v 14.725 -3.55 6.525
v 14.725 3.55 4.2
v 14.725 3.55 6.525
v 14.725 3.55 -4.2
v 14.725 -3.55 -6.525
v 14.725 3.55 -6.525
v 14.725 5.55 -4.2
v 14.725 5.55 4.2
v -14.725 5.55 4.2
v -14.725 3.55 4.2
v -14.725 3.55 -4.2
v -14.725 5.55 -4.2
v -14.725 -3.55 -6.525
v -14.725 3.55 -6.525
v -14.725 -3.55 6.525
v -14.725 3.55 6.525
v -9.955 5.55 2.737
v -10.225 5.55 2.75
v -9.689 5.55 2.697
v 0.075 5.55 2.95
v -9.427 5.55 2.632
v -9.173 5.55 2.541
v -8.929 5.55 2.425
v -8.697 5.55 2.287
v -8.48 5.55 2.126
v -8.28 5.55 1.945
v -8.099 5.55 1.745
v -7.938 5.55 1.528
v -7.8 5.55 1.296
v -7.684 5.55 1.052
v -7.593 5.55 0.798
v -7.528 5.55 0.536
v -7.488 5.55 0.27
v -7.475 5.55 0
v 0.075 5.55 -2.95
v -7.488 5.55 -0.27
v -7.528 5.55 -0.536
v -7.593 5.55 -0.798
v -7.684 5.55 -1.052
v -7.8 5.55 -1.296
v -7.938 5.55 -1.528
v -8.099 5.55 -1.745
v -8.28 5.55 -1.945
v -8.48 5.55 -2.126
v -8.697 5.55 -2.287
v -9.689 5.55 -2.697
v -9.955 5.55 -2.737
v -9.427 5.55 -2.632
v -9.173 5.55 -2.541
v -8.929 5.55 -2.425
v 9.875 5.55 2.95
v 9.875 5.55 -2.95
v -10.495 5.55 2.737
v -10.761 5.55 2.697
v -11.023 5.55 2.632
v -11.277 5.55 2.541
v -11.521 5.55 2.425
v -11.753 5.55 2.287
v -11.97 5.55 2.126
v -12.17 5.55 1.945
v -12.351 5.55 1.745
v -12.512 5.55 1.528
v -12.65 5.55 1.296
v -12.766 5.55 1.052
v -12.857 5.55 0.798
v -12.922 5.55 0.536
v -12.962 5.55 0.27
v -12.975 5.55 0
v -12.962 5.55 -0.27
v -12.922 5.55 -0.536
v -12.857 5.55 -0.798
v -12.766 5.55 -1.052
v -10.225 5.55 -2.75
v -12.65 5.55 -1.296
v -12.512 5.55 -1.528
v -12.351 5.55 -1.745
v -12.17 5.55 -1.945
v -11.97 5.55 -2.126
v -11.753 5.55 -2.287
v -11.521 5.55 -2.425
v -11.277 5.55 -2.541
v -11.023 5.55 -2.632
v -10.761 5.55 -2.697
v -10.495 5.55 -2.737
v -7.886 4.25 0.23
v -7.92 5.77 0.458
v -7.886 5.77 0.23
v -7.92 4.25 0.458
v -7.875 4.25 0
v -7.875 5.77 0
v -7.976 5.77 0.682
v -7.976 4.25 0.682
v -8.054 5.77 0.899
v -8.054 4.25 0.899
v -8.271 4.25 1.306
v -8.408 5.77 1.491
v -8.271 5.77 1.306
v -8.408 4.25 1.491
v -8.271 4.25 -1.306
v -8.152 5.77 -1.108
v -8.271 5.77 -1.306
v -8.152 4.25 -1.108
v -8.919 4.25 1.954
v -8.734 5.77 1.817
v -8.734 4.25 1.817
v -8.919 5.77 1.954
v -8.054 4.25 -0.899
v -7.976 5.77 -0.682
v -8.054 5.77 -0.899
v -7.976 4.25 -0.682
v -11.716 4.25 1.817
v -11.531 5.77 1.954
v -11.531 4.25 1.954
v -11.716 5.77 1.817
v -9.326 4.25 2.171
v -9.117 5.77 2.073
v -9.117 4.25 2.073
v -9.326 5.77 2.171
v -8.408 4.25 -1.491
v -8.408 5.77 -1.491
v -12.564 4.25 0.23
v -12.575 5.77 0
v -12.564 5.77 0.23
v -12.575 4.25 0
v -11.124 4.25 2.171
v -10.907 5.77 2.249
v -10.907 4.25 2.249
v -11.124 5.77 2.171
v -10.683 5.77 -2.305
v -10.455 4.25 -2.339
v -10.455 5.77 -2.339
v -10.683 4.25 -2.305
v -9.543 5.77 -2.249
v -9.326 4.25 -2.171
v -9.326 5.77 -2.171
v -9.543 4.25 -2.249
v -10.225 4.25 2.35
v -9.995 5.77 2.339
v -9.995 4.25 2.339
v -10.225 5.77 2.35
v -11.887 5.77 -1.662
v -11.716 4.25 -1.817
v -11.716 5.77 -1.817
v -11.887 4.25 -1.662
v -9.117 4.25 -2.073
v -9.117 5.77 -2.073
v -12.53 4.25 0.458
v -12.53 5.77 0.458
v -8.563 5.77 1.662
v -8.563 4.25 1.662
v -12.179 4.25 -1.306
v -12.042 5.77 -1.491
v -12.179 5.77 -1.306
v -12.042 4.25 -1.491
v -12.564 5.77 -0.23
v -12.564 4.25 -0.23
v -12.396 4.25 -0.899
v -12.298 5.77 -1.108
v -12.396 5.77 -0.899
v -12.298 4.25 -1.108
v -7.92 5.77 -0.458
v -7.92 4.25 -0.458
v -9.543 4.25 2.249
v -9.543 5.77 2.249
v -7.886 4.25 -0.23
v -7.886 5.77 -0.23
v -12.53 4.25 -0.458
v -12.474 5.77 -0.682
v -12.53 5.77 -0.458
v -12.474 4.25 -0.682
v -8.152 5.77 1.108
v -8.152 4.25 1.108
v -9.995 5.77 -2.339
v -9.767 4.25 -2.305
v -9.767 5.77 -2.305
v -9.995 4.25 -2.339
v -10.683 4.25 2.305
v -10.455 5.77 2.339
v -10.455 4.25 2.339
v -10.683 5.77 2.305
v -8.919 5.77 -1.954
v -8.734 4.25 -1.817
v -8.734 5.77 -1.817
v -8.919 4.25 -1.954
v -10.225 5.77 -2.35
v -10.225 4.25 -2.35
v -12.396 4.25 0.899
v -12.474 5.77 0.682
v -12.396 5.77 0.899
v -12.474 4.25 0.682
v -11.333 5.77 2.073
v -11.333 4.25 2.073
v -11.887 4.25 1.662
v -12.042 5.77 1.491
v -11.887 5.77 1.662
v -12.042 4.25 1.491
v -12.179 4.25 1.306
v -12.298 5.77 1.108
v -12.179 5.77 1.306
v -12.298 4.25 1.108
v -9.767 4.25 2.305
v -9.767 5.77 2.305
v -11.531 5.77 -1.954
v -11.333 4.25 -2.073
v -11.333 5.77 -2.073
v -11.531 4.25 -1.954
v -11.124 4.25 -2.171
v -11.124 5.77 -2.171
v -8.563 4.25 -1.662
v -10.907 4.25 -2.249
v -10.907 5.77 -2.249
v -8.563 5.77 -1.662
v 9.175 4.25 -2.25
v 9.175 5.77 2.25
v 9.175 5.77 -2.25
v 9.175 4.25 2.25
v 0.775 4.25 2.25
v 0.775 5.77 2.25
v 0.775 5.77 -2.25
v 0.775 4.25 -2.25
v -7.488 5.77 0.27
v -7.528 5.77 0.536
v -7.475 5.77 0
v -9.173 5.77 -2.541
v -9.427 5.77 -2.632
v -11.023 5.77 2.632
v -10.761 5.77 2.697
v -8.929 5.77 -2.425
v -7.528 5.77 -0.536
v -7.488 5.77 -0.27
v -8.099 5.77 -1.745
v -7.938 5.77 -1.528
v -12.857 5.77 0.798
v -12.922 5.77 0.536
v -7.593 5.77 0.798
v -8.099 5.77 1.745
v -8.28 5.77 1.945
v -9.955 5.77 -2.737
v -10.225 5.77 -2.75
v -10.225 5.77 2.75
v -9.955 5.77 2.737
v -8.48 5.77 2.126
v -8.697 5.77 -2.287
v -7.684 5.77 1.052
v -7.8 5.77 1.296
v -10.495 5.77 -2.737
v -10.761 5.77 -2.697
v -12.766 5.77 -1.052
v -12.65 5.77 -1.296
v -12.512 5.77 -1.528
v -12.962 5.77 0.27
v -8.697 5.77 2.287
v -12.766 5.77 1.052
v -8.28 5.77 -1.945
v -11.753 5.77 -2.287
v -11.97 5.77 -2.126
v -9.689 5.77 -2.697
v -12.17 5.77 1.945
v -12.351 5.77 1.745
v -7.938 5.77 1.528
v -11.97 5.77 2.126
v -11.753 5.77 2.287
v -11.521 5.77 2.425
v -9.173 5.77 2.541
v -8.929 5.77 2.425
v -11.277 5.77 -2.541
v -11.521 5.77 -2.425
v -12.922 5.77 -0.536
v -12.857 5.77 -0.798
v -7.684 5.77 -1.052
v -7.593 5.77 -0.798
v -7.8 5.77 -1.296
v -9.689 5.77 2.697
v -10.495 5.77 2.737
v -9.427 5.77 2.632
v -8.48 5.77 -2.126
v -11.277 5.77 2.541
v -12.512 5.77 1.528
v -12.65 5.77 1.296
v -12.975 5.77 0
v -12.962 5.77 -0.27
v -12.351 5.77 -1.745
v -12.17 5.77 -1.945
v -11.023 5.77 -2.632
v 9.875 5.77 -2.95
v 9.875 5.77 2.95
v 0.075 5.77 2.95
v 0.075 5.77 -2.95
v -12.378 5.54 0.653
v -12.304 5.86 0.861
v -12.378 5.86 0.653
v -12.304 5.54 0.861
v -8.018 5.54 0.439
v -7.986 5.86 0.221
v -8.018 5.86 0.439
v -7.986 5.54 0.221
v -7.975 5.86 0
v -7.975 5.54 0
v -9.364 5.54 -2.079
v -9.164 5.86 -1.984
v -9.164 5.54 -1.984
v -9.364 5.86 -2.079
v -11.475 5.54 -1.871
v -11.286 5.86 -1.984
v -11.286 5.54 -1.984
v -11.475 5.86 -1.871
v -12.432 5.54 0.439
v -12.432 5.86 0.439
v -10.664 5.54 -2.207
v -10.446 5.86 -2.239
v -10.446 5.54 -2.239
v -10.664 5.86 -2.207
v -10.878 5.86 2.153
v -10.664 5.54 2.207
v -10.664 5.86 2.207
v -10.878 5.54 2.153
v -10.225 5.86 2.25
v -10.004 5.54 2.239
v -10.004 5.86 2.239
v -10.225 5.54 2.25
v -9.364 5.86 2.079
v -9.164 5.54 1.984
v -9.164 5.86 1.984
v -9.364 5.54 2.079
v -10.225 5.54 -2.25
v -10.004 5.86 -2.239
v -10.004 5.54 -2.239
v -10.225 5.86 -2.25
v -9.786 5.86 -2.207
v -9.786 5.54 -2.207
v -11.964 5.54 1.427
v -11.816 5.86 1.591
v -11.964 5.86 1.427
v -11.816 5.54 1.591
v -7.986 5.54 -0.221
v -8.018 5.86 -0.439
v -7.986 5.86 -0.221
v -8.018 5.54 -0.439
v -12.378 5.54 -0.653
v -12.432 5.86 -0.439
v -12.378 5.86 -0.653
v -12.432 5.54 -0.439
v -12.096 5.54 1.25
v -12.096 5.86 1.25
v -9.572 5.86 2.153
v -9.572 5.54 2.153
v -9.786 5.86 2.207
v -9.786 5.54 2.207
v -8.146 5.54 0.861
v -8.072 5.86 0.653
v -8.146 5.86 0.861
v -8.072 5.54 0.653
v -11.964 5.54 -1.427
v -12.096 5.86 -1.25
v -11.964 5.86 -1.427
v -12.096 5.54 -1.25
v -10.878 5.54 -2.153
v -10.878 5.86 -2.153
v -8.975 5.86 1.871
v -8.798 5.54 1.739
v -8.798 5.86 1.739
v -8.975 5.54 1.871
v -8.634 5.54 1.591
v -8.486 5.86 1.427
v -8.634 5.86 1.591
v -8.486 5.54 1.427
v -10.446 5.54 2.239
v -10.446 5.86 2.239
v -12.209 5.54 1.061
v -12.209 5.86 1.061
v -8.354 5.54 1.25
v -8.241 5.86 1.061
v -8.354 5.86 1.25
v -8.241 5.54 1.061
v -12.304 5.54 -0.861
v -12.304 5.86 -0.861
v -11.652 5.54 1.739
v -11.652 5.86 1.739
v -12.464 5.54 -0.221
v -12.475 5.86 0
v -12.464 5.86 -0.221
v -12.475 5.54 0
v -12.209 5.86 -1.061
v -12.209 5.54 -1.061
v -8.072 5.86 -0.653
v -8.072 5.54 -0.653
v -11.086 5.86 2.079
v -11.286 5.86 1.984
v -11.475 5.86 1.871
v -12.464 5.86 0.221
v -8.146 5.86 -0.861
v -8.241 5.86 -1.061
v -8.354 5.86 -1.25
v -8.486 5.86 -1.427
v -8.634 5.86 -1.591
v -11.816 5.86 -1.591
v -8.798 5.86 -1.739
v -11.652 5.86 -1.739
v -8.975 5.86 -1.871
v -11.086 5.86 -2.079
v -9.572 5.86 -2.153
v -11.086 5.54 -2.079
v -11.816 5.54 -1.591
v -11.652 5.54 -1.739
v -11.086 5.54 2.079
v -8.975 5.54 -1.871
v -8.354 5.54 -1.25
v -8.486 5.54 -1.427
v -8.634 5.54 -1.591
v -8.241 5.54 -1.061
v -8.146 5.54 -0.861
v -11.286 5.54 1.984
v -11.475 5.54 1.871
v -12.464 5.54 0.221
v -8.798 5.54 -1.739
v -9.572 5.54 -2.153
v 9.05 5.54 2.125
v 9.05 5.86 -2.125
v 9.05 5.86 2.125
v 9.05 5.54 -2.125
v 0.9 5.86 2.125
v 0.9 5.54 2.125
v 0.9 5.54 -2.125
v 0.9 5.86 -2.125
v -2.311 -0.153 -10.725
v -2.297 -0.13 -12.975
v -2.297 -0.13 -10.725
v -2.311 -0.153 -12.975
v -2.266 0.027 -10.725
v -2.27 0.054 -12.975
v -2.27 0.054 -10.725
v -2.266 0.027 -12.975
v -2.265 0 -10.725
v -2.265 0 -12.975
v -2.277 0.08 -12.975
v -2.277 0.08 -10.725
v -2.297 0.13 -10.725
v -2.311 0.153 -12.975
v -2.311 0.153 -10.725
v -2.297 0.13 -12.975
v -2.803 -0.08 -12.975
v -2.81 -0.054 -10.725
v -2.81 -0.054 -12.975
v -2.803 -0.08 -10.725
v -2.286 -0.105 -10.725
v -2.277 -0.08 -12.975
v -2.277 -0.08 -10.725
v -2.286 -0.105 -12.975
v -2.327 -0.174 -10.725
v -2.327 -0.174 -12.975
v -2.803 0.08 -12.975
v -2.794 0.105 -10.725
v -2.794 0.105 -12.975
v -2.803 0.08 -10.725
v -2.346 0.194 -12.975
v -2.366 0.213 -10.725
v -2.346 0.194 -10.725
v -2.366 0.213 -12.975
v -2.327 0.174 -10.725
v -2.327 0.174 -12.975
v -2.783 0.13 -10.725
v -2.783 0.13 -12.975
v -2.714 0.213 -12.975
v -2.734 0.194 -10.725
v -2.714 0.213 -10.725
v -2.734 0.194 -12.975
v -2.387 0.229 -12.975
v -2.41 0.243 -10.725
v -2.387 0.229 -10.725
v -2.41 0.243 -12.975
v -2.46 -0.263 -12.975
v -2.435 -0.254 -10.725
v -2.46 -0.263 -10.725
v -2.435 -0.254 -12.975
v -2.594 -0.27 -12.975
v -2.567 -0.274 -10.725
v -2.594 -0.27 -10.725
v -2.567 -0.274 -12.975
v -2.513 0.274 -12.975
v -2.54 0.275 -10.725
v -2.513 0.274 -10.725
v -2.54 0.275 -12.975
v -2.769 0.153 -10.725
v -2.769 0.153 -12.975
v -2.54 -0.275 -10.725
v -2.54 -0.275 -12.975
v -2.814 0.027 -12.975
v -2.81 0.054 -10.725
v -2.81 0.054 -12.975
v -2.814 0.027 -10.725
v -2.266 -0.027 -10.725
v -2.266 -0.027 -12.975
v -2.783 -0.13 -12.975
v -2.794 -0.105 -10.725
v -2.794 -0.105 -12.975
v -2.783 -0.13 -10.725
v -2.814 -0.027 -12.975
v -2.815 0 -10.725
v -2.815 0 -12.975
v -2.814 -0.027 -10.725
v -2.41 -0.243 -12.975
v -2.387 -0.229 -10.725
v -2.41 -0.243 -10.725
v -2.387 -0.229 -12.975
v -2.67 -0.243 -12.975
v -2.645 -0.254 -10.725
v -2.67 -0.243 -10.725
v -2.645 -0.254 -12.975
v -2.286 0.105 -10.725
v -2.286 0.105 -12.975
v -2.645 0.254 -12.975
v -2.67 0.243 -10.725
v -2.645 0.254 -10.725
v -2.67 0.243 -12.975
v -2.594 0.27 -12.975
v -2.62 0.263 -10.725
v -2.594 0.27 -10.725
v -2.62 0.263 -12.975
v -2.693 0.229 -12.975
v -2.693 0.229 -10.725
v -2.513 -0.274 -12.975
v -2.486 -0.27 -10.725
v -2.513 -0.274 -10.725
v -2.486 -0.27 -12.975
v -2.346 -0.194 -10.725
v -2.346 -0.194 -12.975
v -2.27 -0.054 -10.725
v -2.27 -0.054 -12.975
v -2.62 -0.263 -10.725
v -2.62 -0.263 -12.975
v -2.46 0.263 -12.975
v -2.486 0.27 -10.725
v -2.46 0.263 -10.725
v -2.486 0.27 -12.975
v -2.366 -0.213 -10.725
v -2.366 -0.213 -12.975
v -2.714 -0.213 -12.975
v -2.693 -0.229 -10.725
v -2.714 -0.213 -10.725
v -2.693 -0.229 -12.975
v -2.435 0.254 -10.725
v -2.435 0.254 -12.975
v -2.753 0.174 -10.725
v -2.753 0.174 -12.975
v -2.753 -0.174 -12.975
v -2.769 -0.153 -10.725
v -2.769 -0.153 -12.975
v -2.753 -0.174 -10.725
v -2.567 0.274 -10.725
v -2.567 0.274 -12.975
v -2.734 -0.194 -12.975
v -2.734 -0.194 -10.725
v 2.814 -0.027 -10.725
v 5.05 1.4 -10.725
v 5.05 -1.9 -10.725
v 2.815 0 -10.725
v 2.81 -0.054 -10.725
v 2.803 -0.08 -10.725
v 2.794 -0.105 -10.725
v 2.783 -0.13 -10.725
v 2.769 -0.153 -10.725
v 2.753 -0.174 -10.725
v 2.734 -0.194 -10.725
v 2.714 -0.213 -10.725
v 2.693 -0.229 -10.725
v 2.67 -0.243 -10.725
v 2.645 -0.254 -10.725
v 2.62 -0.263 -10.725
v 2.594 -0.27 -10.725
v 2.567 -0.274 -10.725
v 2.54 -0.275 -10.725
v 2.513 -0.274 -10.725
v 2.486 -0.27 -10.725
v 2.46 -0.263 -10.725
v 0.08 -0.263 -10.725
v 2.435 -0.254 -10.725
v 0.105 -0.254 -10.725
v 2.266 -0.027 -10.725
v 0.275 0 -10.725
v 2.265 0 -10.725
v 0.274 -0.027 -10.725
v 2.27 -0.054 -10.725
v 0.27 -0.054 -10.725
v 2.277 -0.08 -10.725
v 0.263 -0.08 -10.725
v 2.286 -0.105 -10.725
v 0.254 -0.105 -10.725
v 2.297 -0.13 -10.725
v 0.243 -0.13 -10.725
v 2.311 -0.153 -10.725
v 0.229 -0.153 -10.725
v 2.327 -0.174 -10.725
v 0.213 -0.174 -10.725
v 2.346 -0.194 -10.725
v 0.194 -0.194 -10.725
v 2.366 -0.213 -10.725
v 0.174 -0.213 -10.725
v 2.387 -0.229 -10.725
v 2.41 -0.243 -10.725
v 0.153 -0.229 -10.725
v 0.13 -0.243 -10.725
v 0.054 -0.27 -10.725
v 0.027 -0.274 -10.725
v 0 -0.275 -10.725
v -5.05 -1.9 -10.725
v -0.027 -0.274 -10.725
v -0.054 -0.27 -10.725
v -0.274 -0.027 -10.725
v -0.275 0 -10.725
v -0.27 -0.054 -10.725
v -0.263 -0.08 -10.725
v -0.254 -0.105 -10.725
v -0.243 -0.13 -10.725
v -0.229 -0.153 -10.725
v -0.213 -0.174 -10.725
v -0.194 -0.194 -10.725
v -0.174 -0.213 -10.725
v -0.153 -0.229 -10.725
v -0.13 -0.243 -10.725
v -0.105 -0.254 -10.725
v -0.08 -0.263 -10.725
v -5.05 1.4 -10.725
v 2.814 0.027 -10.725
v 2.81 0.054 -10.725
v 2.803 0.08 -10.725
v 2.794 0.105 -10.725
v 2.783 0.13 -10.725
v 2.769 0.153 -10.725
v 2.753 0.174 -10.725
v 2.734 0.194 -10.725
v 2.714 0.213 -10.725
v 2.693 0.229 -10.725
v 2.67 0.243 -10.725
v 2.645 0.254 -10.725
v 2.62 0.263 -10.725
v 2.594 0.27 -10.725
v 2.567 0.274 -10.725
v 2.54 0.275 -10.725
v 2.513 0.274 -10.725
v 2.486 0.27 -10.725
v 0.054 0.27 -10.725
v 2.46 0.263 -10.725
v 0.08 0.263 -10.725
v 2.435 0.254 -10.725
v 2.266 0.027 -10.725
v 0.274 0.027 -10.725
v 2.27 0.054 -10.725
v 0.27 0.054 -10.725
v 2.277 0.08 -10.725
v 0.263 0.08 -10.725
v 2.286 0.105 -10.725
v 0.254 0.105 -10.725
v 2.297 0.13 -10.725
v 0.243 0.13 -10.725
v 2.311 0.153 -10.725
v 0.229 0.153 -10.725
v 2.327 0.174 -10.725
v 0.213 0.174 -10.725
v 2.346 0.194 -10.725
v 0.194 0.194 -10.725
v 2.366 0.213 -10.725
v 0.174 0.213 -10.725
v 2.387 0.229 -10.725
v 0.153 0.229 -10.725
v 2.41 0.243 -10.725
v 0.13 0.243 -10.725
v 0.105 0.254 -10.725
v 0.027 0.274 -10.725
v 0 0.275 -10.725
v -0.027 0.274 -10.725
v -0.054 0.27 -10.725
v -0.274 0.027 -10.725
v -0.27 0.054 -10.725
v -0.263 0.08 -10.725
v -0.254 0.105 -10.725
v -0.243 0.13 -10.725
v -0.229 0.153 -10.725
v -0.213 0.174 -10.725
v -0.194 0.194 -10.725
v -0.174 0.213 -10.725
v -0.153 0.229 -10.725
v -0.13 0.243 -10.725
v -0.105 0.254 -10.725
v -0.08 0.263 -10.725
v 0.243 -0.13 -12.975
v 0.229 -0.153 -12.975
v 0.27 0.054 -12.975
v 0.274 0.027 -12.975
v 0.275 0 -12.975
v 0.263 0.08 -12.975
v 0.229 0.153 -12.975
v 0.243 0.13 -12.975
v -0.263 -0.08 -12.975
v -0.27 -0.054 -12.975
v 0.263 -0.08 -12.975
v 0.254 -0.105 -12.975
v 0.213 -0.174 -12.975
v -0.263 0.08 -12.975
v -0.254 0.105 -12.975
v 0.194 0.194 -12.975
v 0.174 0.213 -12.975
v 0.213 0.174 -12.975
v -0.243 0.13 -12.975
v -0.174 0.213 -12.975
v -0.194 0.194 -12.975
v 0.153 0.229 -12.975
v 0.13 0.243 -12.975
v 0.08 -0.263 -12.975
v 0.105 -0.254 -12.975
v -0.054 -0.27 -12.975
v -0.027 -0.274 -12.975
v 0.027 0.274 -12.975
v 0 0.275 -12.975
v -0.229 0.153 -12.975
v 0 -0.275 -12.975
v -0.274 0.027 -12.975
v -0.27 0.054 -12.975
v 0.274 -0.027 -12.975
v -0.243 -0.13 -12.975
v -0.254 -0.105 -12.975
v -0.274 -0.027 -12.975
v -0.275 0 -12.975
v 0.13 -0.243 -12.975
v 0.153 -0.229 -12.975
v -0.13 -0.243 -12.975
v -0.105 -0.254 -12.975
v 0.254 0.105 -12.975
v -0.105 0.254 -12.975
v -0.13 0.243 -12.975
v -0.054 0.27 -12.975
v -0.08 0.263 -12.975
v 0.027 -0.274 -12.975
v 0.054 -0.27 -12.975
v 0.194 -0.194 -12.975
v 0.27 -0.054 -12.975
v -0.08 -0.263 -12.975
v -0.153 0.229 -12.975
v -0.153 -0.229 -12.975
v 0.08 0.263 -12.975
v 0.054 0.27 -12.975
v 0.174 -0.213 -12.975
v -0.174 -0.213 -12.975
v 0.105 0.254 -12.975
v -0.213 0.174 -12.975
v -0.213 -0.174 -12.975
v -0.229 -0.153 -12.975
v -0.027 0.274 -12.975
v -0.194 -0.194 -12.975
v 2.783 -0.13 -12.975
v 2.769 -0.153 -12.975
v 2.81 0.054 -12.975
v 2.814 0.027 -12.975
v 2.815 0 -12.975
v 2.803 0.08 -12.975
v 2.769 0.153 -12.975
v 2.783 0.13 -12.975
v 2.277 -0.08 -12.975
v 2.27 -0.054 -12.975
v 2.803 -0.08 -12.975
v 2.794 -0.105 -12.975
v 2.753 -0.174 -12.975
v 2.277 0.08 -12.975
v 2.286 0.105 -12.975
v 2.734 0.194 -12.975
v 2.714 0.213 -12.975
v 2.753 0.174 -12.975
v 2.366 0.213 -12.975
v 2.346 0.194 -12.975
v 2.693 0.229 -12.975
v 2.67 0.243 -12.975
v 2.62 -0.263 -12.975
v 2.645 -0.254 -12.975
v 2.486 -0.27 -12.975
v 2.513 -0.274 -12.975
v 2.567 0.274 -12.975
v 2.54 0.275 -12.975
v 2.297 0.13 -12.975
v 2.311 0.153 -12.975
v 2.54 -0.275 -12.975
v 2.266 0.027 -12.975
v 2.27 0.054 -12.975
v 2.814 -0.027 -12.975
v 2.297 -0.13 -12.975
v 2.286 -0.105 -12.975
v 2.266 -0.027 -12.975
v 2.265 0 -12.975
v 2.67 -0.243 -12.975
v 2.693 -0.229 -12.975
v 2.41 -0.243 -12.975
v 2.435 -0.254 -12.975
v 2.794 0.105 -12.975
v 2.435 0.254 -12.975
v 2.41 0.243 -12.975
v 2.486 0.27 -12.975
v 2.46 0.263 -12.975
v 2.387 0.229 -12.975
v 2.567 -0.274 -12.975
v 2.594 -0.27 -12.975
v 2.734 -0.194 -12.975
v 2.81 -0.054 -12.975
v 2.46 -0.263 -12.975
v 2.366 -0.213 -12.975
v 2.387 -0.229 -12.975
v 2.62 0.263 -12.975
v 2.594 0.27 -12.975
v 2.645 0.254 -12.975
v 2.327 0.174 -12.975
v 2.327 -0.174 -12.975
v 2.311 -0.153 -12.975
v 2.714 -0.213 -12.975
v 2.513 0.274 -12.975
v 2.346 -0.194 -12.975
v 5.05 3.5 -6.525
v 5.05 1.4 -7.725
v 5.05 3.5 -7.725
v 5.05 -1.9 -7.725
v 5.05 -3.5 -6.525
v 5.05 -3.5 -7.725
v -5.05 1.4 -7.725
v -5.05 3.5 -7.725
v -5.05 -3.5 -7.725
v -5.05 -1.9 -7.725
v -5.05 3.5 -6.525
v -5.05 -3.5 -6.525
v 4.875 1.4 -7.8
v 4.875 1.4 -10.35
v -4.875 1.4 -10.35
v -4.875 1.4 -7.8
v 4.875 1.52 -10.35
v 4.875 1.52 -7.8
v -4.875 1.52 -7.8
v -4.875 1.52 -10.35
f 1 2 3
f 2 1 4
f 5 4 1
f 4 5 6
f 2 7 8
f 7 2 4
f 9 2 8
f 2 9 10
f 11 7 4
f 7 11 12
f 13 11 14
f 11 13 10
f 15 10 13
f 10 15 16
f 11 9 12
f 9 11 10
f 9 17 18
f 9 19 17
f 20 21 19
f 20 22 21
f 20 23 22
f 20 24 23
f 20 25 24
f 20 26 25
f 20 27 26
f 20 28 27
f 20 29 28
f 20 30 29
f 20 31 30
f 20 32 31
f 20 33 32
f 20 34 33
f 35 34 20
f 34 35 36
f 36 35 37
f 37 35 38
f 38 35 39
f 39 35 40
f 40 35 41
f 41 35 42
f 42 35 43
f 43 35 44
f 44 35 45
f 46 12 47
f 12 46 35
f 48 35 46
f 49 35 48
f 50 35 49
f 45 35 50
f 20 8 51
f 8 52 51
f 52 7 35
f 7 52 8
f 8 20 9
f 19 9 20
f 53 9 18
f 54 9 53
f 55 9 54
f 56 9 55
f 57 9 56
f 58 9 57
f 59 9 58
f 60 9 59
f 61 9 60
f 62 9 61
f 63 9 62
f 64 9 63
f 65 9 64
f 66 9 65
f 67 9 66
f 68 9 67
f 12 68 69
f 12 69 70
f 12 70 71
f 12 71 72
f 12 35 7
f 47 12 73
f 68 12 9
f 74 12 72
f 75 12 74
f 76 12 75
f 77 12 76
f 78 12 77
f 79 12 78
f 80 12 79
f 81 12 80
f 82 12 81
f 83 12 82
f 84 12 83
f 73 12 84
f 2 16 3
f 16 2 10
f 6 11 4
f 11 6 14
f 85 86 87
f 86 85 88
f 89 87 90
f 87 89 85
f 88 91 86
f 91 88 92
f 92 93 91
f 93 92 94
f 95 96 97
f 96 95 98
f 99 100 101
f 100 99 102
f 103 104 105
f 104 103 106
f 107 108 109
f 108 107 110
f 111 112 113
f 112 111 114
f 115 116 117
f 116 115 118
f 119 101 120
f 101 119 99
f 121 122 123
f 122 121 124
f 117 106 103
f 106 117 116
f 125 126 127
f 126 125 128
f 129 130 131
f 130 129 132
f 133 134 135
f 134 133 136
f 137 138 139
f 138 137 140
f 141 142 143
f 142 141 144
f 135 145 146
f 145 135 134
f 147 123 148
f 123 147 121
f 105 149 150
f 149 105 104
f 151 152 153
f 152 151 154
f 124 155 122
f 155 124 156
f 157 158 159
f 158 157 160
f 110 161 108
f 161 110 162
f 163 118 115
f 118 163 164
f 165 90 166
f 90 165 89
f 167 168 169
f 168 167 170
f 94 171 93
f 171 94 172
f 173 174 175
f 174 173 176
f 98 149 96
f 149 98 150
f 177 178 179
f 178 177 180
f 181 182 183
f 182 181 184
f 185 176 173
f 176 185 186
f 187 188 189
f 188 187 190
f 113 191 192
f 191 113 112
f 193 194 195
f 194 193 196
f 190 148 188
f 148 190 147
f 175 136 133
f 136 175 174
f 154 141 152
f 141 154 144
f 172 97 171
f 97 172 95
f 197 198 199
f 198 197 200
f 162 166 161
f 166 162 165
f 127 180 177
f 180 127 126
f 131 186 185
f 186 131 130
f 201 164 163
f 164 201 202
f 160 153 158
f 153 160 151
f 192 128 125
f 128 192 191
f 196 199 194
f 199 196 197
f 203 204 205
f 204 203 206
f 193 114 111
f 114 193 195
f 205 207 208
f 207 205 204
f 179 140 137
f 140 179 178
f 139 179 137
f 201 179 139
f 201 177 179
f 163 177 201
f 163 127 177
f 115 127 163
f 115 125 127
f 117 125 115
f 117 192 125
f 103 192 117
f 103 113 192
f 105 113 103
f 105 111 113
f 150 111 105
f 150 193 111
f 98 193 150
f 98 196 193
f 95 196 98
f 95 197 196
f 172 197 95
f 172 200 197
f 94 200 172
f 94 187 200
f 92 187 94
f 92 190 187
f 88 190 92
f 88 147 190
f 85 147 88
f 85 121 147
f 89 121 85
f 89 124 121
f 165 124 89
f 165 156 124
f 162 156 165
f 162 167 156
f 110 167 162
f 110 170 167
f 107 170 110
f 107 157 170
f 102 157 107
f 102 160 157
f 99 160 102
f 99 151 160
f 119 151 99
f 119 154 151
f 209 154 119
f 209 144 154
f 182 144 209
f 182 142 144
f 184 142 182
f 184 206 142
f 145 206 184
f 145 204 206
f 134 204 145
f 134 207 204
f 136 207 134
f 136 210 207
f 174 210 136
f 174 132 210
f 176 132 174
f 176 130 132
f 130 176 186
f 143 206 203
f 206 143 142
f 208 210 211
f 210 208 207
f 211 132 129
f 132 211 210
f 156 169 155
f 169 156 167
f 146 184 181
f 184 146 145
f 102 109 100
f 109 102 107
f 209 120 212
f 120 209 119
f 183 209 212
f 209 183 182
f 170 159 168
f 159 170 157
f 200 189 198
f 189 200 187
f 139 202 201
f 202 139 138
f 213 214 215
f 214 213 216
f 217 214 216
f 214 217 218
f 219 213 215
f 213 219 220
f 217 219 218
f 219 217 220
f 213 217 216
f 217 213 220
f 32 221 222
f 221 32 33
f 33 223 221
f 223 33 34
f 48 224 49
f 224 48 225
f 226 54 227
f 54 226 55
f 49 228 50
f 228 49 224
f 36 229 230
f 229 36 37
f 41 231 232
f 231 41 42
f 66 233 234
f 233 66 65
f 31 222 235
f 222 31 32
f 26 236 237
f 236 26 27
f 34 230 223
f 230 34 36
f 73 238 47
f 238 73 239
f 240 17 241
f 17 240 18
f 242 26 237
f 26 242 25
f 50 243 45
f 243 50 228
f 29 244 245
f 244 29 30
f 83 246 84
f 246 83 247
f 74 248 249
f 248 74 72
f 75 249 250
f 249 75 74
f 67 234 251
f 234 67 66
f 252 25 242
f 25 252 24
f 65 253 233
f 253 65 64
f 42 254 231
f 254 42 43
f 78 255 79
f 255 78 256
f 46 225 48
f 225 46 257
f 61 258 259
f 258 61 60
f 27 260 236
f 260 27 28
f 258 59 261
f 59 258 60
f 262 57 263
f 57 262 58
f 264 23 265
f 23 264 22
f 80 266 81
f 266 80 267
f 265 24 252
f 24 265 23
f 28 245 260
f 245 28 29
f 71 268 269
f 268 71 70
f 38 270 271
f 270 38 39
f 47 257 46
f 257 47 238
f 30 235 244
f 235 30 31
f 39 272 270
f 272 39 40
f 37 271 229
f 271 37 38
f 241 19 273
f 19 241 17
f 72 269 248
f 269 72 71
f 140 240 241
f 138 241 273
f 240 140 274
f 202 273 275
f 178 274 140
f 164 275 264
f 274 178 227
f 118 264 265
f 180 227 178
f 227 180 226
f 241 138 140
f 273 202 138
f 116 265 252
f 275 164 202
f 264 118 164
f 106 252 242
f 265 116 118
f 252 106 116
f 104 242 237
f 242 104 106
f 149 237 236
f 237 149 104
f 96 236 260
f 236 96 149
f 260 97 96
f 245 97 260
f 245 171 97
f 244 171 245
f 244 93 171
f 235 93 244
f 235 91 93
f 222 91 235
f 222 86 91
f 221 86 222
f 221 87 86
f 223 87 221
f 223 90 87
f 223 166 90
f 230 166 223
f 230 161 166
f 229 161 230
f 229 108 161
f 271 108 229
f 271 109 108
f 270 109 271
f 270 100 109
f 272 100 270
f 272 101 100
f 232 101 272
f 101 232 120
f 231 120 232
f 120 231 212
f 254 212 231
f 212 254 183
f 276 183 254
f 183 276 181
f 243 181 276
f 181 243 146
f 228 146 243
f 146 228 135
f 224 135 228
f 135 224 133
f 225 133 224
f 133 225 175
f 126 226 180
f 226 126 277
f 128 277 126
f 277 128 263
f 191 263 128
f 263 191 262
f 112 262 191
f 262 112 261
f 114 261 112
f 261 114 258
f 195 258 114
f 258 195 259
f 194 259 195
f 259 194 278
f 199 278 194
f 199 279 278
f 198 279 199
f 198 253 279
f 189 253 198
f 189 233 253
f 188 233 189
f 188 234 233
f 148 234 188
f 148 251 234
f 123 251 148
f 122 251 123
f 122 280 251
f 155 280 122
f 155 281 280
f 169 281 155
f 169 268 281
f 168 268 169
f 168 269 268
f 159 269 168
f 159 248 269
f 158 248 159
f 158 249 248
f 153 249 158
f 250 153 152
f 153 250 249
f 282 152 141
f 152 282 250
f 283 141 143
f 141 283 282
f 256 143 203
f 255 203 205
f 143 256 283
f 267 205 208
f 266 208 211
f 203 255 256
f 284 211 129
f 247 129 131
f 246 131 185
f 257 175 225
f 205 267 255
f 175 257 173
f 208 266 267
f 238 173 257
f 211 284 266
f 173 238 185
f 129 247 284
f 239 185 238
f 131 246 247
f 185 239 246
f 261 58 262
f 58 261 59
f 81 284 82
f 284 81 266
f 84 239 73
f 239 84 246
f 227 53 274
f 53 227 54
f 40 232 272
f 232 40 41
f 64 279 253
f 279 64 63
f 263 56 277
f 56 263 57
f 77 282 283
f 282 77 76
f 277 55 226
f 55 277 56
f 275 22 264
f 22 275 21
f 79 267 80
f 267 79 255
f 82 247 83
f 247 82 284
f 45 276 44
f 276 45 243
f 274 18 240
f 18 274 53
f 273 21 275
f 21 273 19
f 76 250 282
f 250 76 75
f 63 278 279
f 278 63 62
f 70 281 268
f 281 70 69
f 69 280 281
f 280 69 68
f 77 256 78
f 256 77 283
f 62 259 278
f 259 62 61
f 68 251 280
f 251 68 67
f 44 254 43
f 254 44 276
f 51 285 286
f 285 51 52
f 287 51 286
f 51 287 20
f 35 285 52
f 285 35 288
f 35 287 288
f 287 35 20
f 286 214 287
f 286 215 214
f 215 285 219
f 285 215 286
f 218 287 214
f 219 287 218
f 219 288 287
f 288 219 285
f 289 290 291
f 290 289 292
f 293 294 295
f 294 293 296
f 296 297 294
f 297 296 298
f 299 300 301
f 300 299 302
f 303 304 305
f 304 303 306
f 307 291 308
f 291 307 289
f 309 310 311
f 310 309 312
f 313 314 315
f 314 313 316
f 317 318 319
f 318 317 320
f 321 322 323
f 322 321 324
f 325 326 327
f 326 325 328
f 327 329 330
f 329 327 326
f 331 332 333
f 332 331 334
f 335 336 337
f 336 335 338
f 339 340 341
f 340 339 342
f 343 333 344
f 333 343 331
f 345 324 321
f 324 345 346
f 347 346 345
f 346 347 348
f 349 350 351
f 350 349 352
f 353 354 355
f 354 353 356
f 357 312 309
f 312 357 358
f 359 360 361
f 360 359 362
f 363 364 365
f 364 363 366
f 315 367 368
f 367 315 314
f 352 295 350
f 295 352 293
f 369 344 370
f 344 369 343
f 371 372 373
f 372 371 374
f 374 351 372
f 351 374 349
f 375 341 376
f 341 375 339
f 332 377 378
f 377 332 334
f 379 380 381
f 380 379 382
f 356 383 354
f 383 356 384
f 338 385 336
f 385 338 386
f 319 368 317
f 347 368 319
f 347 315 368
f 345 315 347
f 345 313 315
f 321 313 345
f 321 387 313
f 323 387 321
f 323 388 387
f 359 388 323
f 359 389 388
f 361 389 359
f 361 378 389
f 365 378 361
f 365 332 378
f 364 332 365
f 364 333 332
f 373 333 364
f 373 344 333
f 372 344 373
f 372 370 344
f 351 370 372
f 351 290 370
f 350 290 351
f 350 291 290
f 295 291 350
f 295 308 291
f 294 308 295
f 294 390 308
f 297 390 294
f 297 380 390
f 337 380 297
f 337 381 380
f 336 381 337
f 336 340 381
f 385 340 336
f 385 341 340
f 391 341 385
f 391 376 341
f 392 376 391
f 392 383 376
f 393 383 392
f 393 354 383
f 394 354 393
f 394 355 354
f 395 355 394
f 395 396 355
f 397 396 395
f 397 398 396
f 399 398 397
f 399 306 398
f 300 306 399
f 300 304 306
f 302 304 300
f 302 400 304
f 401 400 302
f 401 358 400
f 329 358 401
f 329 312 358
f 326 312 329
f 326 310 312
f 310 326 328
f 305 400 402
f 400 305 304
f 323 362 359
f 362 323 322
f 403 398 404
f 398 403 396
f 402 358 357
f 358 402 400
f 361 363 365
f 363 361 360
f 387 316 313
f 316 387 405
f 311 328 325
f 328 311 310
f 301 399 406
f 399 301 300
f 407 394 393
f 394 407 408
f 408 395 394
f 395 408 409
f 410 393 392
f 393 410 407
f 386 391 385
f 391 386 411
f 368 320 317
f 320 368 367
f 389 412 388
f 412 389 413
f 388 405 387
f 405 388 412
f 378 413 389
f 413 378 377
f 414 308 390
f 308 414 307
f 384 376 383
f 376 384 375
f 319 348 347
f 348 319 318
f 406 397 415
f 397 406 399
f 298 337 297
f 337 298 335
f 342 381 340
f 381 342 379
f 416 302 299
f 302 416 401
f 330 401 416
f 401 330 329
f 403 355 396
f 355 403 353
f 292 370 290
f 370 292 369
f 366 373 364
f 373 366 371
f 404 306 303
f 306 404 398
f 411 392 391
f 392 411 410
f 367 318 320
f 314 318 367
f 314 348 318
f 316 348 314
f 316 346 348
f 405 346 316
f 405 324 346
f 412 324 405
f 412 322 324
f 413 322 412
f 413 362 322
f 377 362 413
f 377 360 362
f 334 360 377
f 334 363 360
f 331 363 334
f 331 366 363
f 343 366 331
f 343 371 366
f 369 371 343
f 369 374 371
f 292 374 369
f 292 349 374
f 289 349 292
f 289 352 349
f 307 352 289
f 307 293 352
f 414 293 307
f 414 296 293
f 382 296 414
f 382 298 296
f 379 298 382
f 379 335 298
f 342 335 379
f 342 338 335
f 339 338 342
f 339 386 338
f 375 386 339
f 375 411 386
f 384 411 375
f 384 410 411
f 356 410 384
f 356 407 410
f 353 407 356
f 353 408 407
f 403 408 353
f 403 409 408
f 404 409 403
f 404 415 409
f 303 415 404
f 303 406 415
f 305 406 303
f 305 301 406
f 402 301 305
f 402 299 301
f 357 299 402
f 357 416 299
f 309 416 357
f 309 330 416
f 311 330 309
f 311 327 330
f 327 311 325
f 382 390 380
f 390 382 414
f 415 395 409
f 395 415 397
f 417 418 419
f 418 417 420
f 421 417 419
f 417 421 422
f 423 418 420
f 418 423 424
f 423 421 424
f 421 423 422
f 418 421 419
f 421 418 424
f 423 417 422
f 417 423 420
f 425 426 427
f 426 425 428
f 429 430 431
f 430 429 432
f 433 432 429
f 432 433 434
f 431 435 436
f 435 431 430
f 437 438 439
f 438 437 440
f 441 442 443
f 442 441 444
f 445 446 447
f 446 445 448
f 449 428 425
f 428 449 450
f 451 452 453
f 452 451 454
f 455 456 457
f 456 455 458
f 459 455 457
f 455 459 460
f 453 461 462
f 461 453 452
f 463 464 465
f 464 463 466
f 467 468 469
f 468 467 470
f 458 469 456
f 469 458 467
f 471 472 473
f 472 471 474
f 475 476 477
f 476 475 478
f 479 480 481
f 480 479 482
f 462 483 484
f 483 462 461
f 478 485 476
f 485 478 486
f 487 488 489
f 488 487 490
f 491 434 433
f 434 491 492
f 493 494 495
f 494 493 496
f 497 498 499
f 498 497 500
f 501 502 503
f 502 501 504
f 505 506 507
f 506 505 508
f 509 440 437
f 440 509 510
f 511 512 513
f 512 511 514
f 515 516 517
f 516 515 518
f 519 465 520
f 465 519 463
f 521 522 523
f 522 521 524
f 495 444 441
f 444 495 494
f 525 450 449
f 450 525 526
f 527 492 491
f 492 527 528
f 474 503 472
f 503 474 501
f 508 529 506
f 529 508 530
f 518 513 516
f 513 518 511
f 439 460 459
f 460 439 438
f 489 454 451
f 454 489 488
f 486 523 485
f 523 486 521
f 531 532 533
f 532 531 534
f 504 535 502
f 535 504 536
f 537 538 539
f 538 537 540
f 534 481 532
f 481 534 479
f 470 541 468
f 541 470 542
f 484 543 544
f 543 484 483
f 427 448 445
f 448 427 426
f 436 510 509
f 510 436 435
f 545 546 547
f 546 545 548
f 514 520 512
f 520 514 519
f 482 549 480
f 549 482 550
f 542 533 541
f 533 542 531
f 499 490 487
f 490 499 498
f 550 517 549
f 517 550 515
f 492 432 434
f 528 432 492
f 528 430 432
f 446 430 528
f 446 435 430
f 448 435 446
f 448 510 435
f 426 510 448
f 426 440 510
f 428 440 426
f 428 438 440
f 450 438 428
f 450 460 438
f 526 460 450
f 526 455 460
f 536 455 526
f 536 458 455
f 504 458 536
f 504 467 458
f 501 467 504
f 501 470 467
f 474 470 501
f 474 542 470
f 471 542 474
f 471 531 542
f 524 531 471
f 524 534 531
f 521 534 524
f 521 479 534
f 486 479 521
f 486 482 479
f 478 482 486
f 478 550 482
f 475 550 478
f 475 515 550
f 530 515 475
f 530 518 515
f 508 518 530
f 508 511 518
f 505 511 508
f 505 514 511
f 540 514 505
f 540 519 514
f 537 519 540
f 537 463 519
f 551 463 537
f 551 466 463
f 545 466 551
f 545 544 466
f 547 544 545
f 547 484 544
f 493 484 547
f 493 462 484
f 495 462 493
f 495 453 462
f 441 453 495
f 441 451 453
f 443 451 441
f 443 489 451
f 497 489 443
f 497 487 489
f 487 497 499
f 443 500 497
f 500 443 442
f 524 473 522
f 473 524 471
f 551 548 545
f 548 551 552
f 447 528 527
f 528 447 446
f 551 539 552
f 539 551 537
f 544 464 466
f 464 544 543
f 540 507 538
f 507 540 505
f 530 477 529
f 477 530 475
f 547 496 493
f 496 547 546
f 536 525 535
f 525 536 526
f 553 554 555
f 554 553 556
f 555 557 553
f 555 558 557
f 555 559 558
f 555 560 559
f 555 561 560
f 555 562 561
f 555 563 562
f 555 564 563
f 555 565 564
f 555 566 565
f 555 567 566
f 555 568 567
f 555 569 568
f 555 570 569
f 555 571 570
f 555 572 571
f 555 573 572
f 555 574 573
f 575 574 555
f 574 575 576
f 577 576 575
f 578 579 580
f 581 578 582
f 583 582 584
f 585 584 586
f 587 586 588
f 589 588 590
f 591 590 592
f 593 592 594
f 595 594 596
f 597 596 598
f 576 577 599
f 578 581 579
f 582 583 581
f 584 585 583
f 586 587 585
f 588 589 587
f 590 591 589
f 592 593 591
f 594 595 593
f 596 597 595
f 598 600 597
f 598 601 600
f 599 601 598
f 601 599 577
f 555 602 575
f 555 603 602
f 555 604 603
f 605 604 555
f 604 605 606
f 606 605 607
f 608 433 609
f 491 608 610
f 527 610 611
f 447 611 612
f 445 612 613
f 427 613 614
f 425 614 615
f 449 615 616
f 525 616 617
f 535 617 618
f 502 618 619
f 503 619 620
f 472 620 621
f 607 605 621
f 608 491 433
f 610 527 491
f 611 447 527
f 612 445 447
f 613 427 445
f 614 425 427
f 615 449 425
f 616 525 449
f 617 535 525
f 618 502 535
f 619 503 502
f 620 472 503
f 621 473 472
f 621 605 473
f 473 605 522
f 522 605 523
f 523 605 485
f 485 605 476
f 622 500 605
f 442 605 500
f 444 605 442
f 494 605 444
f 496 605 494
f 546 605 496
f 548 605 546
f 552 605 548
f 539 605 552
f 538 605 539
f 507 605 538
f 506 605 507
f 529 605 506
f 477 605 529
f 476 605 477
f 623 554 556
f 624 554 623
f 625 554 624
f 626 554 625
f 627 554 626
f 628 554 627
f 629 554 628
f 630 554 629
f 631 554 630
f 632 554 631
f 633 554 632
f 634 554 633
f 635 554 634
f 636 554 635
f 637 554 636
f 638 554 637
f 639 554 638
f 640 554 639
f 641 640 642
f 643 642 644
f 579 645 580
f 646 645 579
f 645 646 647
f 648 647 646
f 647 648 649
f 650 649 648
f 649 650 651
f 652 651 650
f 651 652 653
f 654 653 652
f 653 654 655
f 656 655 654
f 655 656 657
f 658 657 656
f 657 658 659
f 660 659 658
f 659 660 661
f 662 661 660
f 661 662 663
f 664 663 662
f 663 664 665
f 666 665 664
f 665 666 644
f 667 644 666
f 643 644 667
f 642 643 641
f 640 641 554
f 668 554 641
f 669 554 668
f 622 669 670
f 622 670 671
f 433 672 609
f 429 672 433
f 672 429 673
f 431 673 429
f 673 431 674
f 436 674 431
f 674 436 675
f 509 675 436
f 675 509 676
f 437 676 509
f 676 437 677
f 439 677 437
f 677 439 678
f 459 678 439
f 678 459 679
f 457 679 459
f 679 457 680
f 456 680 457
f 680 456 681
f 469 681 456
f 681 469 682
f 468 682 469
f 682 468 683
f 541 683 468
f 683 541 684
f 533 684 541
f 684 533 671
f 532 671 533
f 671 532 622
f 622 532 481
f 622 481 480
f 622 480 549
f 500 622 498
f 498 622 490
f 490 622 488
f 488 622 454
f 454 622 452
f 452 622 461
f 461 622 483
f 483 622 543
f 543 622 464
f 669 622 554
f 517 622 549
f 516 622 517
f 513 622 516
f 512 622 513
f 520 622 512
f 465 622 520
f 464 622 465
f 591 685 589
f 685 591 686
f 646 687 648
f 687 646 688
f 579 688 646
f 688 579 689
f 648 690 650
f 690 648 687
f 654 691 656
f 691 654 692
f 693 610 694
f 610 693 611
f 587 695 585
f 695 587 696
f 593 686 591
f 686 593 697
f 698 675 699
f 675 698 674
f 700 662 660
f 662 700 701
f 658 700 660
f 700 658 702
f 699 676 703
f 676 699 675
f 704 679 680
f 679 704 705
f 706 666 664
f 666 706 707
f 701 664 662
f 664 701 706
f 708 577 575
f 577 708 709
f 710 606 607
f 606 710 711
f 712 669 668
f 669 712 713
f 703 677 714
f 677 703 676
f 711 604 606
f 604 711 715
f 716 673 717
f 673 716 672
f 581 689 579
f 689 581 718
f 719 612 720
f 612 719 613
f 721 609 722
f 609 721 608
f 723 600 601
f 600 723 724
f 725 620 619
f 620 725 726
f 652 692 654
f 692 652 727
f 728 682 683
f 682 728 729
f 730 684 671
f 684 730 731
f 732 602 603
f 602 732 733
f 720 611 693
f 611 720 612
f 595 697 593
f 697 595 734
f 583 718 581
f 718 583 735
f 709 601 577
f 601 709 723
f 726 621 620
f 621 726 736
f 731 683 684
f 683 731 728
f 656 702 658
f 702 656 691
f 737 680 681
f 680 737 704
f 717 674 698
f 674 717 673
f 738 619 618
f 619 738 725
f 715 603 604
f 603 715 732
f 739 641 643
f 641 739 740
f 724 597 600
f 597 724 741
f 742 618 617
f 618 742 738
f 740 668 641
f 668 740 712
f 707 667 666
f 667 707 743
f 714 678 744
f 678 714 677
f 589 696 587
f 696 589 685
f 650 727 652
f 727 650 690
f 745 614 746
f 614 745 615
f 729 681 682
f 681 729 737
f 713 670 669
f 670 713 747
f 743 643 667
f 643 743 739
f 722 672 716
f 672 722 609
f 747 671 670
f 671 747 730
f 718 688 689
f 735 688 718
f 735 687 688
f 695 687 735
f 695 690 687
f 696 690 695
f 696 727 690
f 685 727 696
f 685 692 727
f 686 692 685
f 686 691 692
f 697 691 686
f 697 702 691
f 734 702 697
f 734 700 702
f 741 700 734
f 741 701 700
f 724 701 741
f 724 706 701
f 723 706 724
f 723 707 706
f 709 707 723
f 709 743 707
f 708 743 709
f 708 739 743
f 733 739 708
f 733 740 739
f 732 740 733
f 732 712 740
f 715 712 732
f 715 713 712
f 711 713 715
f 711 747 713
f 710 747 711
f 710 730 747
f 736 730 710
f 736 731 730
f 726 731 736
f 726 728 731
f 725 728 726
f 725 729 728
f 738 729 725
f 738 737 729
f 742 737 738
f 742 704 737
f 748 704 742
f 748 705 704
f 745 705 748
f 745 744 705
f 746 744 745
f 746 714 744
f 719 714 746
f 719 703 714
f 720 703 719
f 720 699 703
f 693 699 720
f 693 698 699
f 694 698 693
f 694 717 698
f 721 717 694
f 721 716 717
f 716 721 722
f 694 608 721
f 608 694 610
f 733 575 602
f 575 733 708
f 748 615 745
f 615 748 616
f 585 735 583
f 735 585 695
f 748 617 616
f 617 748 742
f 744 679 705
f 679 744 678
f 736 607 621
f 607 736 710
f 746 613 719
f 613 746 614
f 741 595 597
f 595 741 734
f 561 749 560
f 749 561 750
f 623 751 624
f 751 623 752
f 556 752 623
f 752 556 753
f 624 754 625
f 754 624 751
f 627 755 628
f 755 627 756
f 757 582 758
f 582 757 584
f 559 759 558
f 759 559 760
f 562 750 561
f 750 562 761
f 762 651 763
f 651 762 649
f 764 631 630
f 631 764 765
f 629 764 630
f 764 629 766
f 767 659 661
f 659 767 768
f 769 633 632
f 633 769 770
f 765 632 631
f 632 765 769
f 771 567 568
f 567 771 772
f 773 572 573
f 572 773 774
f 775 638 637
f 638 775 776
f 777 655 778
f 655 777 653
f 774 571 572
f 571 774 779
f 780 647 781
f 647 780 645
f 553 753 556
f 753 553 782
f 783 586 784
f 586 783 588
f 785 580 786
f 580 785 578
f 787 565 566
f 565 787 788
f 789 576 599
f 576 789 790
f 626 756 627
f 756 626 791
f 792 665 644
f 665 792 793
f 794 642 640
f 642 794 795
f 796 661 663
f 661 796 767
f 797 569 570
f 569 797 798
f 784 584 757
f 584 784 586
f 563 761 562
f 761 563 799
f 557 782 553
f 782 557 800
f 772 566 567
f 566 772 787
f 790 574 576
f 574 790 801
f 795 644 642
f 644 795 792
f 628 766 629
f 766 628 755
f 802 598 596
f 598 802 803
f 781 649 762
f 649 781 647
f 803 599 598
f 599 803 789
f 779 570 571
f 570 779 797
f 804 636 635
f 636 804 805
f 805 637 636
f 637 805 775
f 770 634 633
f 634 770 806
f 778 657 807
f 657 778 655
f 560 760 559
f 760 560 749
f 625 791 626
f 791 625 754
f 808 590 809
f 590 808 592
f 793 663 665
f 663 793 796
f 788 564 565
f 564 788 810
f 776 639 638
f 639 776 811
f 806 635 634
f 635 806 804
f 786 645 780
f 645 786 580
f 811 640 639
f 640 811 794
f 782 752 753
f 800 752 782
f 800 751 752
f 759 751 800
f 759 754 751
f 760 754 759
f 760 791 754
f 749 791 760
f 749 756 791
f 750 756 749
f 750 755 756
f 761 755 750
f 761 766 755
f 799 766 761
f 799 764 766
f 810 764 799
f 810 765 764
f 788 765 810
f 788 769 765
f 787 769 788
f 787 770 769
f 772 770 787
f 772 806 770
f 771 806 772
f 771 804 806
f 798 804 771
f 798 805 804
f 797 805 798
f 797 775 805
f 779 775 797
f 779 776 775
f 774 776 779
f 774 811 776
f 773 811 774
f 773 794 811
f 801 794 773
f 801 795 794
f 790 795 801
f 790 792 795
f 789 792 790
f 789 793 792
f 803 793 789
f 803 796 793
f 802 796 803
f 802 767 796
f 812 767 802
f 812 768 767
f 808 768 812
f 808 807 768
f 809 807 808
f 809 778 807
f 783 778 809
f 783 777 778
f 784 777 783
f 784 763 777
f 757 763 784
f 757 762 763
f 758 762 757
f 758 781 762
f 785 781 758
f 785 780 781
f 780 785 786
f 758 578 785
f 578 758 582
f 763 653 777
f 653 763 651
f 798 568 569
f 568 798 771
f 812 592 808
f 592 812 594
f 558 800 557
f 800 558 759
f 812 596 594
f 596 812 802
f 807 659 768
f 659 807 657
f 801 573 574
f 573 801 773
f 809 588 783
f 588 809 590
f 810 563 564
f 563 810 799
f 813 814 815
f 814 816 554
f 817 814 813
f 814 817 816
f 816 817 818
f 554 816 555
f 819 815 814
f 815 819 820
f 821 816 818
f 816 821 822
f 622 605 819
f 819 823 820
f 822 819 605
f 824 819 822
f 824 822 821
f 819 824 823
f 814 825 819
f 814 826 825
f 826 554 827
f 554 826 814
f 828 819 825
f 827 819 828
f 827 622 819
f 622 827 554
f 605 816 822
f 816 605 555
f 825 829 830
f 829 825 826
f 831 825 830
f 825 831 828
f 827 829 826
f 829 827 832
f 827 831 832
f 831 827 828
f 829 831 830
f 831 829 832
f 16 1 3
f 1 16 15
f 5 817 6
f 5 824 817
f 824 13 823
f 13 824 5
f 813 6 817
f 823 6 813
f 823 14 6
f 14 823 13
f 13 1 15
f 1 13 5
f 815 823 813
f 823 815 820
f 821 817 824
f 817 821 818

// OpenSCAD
// Sharp GP2Y0D413K0F distance sensor
// Units: mm
// Coordinate system: body center at origin, lens toward +Y, top +Z

$fn = 64;

body_w = 29.45;
body_d = 7.10;
body_h = 13.05;

lens_case_w = 29.45;
lens_case_d = 2.00;
lens_case_h = 8.40;

body_front = body_d / 2;
lens_front = body_front + lens_case_d;

left_lens_x  = -body_w / 2 + 4.50;
right_lens_x = -body_w / 2 + 19.70;
lens_z = 0;

// PWB
pwb_w = 10.10;
pwb_d = 7.00;
pwb_t = 1.20;
pwb_z = -body_h / 2 - pwb_t / 2;

// Connector
connector_w = 10.10;
connector_d = 3.30;
connector_h = 3.00;
connector_z = -body_h / 2 - pwb_t - connector_h / 2;

// ---------- Utility modules ----------

module y_cylinder(x, y, z, radius, depth, color_name) {
    color(color_name)
        translate([x, y, z])
            rotate([90, 0, 0])
                cylinder(r = radius, h = depth, center = true);
}

module rectangular_lens(x, y, z, w, h, depth, color_name) {
    color(color_name)
        translate([x, y, z])
            cube([w, depth, h], center = true);
}

module pin(x, y, z, diameter = 0.55, length = 2.2) {
    color("gold")
        translate([x, y, z - length / 2])
            cylinder(d = diameter, h = length, center = true);
}

// ---------- Main body ----------

module main_case() {
    color("dimgray")
        translate([0, 0, 0])
            cube([body_w, body_d, body_h], center = true);
}

// ---------- Front lens case ----------

module lens_case() {
    difference() {
        color("black")
            translate([0,
                       body_front + lens_case_d / 2,
                       lens_z])
                cube([lens_case_w, lens_case_d, lens_case_h],
                     center = true);

        // Light emitter opening
        translate([left_lens_x, lens_front, lens_z])
            rotate([90, 0, 0])
                cylinder(r = 2.35, h = 2.6, center = true);

        // Light detector opening
        translate([right_lens_x, lens_front, lens_z])
            cube([8.40, 2.6, 4.50], center = true);
    }

    // Emitter outer retaining ring
    difference() {
        color("black")
            translate([left_lens_x, lens_front + 0.08, lens_z])
                rotate([90, 0, 0])
                    cylinder(r = 2.75, h = 0.28, center = true);

        translate([left_lens_x, lens_front + 0.08, lens_z])
            rotate([90, 0, 0])
                cylinder(r = 2.35, h = 0.40, center = true);
    }

    // Emitter lens
    y_cylinder(left_lens_x, lens_front + 0.15, lens_z,
               2.25, 0.32, "lightblue");

    // Detector retaining frame
    difference() {
        color("black")
            translate([right_lens_x, lens_front + 0.08, lens_z])
                cube([9.80, 0.28, 5.90], center = true);

        translate([right_lens_x, lens_front + 0.08, lens_z])
            cube([8.40, 0.42, 4.50], center = true);
    }

    // Detector lens
    rectangular_lens(right_lens_x, lens_front + 0.15, lens_z,
                     8.15, 4.25, 0.32, "lightblue");
}

// ---------- PWB ----------

module pwb() {
    color("sienna")
        translate([0, 0, pwb_z])
            cube([pwb_w, pwb_d, pwb_t], center = true);
}

// ---------- Bottom connector ----------

module connector() {
    color("black")
        translate([0, -0.25, connector_z])
            cube([connector_w, connector_d, connector_h], center = true);

    // Front connector face
    color("darkgray")
        translate([0, 1.43, connector_z + 0.15])
            cube([connector_w - 0.35, 0.18, connector_h - 0.45],
                 center = true);

    // Three downward terminals
    for (x = [-2.54, 0, 2.54])
        pin(x, 0.0, connector_z - connector_h / 2,
            diameter = 0.55, length = 2.25);
}

// ---------- Assembly ----------

main_case();
lens_case();
pwb();
connector();
